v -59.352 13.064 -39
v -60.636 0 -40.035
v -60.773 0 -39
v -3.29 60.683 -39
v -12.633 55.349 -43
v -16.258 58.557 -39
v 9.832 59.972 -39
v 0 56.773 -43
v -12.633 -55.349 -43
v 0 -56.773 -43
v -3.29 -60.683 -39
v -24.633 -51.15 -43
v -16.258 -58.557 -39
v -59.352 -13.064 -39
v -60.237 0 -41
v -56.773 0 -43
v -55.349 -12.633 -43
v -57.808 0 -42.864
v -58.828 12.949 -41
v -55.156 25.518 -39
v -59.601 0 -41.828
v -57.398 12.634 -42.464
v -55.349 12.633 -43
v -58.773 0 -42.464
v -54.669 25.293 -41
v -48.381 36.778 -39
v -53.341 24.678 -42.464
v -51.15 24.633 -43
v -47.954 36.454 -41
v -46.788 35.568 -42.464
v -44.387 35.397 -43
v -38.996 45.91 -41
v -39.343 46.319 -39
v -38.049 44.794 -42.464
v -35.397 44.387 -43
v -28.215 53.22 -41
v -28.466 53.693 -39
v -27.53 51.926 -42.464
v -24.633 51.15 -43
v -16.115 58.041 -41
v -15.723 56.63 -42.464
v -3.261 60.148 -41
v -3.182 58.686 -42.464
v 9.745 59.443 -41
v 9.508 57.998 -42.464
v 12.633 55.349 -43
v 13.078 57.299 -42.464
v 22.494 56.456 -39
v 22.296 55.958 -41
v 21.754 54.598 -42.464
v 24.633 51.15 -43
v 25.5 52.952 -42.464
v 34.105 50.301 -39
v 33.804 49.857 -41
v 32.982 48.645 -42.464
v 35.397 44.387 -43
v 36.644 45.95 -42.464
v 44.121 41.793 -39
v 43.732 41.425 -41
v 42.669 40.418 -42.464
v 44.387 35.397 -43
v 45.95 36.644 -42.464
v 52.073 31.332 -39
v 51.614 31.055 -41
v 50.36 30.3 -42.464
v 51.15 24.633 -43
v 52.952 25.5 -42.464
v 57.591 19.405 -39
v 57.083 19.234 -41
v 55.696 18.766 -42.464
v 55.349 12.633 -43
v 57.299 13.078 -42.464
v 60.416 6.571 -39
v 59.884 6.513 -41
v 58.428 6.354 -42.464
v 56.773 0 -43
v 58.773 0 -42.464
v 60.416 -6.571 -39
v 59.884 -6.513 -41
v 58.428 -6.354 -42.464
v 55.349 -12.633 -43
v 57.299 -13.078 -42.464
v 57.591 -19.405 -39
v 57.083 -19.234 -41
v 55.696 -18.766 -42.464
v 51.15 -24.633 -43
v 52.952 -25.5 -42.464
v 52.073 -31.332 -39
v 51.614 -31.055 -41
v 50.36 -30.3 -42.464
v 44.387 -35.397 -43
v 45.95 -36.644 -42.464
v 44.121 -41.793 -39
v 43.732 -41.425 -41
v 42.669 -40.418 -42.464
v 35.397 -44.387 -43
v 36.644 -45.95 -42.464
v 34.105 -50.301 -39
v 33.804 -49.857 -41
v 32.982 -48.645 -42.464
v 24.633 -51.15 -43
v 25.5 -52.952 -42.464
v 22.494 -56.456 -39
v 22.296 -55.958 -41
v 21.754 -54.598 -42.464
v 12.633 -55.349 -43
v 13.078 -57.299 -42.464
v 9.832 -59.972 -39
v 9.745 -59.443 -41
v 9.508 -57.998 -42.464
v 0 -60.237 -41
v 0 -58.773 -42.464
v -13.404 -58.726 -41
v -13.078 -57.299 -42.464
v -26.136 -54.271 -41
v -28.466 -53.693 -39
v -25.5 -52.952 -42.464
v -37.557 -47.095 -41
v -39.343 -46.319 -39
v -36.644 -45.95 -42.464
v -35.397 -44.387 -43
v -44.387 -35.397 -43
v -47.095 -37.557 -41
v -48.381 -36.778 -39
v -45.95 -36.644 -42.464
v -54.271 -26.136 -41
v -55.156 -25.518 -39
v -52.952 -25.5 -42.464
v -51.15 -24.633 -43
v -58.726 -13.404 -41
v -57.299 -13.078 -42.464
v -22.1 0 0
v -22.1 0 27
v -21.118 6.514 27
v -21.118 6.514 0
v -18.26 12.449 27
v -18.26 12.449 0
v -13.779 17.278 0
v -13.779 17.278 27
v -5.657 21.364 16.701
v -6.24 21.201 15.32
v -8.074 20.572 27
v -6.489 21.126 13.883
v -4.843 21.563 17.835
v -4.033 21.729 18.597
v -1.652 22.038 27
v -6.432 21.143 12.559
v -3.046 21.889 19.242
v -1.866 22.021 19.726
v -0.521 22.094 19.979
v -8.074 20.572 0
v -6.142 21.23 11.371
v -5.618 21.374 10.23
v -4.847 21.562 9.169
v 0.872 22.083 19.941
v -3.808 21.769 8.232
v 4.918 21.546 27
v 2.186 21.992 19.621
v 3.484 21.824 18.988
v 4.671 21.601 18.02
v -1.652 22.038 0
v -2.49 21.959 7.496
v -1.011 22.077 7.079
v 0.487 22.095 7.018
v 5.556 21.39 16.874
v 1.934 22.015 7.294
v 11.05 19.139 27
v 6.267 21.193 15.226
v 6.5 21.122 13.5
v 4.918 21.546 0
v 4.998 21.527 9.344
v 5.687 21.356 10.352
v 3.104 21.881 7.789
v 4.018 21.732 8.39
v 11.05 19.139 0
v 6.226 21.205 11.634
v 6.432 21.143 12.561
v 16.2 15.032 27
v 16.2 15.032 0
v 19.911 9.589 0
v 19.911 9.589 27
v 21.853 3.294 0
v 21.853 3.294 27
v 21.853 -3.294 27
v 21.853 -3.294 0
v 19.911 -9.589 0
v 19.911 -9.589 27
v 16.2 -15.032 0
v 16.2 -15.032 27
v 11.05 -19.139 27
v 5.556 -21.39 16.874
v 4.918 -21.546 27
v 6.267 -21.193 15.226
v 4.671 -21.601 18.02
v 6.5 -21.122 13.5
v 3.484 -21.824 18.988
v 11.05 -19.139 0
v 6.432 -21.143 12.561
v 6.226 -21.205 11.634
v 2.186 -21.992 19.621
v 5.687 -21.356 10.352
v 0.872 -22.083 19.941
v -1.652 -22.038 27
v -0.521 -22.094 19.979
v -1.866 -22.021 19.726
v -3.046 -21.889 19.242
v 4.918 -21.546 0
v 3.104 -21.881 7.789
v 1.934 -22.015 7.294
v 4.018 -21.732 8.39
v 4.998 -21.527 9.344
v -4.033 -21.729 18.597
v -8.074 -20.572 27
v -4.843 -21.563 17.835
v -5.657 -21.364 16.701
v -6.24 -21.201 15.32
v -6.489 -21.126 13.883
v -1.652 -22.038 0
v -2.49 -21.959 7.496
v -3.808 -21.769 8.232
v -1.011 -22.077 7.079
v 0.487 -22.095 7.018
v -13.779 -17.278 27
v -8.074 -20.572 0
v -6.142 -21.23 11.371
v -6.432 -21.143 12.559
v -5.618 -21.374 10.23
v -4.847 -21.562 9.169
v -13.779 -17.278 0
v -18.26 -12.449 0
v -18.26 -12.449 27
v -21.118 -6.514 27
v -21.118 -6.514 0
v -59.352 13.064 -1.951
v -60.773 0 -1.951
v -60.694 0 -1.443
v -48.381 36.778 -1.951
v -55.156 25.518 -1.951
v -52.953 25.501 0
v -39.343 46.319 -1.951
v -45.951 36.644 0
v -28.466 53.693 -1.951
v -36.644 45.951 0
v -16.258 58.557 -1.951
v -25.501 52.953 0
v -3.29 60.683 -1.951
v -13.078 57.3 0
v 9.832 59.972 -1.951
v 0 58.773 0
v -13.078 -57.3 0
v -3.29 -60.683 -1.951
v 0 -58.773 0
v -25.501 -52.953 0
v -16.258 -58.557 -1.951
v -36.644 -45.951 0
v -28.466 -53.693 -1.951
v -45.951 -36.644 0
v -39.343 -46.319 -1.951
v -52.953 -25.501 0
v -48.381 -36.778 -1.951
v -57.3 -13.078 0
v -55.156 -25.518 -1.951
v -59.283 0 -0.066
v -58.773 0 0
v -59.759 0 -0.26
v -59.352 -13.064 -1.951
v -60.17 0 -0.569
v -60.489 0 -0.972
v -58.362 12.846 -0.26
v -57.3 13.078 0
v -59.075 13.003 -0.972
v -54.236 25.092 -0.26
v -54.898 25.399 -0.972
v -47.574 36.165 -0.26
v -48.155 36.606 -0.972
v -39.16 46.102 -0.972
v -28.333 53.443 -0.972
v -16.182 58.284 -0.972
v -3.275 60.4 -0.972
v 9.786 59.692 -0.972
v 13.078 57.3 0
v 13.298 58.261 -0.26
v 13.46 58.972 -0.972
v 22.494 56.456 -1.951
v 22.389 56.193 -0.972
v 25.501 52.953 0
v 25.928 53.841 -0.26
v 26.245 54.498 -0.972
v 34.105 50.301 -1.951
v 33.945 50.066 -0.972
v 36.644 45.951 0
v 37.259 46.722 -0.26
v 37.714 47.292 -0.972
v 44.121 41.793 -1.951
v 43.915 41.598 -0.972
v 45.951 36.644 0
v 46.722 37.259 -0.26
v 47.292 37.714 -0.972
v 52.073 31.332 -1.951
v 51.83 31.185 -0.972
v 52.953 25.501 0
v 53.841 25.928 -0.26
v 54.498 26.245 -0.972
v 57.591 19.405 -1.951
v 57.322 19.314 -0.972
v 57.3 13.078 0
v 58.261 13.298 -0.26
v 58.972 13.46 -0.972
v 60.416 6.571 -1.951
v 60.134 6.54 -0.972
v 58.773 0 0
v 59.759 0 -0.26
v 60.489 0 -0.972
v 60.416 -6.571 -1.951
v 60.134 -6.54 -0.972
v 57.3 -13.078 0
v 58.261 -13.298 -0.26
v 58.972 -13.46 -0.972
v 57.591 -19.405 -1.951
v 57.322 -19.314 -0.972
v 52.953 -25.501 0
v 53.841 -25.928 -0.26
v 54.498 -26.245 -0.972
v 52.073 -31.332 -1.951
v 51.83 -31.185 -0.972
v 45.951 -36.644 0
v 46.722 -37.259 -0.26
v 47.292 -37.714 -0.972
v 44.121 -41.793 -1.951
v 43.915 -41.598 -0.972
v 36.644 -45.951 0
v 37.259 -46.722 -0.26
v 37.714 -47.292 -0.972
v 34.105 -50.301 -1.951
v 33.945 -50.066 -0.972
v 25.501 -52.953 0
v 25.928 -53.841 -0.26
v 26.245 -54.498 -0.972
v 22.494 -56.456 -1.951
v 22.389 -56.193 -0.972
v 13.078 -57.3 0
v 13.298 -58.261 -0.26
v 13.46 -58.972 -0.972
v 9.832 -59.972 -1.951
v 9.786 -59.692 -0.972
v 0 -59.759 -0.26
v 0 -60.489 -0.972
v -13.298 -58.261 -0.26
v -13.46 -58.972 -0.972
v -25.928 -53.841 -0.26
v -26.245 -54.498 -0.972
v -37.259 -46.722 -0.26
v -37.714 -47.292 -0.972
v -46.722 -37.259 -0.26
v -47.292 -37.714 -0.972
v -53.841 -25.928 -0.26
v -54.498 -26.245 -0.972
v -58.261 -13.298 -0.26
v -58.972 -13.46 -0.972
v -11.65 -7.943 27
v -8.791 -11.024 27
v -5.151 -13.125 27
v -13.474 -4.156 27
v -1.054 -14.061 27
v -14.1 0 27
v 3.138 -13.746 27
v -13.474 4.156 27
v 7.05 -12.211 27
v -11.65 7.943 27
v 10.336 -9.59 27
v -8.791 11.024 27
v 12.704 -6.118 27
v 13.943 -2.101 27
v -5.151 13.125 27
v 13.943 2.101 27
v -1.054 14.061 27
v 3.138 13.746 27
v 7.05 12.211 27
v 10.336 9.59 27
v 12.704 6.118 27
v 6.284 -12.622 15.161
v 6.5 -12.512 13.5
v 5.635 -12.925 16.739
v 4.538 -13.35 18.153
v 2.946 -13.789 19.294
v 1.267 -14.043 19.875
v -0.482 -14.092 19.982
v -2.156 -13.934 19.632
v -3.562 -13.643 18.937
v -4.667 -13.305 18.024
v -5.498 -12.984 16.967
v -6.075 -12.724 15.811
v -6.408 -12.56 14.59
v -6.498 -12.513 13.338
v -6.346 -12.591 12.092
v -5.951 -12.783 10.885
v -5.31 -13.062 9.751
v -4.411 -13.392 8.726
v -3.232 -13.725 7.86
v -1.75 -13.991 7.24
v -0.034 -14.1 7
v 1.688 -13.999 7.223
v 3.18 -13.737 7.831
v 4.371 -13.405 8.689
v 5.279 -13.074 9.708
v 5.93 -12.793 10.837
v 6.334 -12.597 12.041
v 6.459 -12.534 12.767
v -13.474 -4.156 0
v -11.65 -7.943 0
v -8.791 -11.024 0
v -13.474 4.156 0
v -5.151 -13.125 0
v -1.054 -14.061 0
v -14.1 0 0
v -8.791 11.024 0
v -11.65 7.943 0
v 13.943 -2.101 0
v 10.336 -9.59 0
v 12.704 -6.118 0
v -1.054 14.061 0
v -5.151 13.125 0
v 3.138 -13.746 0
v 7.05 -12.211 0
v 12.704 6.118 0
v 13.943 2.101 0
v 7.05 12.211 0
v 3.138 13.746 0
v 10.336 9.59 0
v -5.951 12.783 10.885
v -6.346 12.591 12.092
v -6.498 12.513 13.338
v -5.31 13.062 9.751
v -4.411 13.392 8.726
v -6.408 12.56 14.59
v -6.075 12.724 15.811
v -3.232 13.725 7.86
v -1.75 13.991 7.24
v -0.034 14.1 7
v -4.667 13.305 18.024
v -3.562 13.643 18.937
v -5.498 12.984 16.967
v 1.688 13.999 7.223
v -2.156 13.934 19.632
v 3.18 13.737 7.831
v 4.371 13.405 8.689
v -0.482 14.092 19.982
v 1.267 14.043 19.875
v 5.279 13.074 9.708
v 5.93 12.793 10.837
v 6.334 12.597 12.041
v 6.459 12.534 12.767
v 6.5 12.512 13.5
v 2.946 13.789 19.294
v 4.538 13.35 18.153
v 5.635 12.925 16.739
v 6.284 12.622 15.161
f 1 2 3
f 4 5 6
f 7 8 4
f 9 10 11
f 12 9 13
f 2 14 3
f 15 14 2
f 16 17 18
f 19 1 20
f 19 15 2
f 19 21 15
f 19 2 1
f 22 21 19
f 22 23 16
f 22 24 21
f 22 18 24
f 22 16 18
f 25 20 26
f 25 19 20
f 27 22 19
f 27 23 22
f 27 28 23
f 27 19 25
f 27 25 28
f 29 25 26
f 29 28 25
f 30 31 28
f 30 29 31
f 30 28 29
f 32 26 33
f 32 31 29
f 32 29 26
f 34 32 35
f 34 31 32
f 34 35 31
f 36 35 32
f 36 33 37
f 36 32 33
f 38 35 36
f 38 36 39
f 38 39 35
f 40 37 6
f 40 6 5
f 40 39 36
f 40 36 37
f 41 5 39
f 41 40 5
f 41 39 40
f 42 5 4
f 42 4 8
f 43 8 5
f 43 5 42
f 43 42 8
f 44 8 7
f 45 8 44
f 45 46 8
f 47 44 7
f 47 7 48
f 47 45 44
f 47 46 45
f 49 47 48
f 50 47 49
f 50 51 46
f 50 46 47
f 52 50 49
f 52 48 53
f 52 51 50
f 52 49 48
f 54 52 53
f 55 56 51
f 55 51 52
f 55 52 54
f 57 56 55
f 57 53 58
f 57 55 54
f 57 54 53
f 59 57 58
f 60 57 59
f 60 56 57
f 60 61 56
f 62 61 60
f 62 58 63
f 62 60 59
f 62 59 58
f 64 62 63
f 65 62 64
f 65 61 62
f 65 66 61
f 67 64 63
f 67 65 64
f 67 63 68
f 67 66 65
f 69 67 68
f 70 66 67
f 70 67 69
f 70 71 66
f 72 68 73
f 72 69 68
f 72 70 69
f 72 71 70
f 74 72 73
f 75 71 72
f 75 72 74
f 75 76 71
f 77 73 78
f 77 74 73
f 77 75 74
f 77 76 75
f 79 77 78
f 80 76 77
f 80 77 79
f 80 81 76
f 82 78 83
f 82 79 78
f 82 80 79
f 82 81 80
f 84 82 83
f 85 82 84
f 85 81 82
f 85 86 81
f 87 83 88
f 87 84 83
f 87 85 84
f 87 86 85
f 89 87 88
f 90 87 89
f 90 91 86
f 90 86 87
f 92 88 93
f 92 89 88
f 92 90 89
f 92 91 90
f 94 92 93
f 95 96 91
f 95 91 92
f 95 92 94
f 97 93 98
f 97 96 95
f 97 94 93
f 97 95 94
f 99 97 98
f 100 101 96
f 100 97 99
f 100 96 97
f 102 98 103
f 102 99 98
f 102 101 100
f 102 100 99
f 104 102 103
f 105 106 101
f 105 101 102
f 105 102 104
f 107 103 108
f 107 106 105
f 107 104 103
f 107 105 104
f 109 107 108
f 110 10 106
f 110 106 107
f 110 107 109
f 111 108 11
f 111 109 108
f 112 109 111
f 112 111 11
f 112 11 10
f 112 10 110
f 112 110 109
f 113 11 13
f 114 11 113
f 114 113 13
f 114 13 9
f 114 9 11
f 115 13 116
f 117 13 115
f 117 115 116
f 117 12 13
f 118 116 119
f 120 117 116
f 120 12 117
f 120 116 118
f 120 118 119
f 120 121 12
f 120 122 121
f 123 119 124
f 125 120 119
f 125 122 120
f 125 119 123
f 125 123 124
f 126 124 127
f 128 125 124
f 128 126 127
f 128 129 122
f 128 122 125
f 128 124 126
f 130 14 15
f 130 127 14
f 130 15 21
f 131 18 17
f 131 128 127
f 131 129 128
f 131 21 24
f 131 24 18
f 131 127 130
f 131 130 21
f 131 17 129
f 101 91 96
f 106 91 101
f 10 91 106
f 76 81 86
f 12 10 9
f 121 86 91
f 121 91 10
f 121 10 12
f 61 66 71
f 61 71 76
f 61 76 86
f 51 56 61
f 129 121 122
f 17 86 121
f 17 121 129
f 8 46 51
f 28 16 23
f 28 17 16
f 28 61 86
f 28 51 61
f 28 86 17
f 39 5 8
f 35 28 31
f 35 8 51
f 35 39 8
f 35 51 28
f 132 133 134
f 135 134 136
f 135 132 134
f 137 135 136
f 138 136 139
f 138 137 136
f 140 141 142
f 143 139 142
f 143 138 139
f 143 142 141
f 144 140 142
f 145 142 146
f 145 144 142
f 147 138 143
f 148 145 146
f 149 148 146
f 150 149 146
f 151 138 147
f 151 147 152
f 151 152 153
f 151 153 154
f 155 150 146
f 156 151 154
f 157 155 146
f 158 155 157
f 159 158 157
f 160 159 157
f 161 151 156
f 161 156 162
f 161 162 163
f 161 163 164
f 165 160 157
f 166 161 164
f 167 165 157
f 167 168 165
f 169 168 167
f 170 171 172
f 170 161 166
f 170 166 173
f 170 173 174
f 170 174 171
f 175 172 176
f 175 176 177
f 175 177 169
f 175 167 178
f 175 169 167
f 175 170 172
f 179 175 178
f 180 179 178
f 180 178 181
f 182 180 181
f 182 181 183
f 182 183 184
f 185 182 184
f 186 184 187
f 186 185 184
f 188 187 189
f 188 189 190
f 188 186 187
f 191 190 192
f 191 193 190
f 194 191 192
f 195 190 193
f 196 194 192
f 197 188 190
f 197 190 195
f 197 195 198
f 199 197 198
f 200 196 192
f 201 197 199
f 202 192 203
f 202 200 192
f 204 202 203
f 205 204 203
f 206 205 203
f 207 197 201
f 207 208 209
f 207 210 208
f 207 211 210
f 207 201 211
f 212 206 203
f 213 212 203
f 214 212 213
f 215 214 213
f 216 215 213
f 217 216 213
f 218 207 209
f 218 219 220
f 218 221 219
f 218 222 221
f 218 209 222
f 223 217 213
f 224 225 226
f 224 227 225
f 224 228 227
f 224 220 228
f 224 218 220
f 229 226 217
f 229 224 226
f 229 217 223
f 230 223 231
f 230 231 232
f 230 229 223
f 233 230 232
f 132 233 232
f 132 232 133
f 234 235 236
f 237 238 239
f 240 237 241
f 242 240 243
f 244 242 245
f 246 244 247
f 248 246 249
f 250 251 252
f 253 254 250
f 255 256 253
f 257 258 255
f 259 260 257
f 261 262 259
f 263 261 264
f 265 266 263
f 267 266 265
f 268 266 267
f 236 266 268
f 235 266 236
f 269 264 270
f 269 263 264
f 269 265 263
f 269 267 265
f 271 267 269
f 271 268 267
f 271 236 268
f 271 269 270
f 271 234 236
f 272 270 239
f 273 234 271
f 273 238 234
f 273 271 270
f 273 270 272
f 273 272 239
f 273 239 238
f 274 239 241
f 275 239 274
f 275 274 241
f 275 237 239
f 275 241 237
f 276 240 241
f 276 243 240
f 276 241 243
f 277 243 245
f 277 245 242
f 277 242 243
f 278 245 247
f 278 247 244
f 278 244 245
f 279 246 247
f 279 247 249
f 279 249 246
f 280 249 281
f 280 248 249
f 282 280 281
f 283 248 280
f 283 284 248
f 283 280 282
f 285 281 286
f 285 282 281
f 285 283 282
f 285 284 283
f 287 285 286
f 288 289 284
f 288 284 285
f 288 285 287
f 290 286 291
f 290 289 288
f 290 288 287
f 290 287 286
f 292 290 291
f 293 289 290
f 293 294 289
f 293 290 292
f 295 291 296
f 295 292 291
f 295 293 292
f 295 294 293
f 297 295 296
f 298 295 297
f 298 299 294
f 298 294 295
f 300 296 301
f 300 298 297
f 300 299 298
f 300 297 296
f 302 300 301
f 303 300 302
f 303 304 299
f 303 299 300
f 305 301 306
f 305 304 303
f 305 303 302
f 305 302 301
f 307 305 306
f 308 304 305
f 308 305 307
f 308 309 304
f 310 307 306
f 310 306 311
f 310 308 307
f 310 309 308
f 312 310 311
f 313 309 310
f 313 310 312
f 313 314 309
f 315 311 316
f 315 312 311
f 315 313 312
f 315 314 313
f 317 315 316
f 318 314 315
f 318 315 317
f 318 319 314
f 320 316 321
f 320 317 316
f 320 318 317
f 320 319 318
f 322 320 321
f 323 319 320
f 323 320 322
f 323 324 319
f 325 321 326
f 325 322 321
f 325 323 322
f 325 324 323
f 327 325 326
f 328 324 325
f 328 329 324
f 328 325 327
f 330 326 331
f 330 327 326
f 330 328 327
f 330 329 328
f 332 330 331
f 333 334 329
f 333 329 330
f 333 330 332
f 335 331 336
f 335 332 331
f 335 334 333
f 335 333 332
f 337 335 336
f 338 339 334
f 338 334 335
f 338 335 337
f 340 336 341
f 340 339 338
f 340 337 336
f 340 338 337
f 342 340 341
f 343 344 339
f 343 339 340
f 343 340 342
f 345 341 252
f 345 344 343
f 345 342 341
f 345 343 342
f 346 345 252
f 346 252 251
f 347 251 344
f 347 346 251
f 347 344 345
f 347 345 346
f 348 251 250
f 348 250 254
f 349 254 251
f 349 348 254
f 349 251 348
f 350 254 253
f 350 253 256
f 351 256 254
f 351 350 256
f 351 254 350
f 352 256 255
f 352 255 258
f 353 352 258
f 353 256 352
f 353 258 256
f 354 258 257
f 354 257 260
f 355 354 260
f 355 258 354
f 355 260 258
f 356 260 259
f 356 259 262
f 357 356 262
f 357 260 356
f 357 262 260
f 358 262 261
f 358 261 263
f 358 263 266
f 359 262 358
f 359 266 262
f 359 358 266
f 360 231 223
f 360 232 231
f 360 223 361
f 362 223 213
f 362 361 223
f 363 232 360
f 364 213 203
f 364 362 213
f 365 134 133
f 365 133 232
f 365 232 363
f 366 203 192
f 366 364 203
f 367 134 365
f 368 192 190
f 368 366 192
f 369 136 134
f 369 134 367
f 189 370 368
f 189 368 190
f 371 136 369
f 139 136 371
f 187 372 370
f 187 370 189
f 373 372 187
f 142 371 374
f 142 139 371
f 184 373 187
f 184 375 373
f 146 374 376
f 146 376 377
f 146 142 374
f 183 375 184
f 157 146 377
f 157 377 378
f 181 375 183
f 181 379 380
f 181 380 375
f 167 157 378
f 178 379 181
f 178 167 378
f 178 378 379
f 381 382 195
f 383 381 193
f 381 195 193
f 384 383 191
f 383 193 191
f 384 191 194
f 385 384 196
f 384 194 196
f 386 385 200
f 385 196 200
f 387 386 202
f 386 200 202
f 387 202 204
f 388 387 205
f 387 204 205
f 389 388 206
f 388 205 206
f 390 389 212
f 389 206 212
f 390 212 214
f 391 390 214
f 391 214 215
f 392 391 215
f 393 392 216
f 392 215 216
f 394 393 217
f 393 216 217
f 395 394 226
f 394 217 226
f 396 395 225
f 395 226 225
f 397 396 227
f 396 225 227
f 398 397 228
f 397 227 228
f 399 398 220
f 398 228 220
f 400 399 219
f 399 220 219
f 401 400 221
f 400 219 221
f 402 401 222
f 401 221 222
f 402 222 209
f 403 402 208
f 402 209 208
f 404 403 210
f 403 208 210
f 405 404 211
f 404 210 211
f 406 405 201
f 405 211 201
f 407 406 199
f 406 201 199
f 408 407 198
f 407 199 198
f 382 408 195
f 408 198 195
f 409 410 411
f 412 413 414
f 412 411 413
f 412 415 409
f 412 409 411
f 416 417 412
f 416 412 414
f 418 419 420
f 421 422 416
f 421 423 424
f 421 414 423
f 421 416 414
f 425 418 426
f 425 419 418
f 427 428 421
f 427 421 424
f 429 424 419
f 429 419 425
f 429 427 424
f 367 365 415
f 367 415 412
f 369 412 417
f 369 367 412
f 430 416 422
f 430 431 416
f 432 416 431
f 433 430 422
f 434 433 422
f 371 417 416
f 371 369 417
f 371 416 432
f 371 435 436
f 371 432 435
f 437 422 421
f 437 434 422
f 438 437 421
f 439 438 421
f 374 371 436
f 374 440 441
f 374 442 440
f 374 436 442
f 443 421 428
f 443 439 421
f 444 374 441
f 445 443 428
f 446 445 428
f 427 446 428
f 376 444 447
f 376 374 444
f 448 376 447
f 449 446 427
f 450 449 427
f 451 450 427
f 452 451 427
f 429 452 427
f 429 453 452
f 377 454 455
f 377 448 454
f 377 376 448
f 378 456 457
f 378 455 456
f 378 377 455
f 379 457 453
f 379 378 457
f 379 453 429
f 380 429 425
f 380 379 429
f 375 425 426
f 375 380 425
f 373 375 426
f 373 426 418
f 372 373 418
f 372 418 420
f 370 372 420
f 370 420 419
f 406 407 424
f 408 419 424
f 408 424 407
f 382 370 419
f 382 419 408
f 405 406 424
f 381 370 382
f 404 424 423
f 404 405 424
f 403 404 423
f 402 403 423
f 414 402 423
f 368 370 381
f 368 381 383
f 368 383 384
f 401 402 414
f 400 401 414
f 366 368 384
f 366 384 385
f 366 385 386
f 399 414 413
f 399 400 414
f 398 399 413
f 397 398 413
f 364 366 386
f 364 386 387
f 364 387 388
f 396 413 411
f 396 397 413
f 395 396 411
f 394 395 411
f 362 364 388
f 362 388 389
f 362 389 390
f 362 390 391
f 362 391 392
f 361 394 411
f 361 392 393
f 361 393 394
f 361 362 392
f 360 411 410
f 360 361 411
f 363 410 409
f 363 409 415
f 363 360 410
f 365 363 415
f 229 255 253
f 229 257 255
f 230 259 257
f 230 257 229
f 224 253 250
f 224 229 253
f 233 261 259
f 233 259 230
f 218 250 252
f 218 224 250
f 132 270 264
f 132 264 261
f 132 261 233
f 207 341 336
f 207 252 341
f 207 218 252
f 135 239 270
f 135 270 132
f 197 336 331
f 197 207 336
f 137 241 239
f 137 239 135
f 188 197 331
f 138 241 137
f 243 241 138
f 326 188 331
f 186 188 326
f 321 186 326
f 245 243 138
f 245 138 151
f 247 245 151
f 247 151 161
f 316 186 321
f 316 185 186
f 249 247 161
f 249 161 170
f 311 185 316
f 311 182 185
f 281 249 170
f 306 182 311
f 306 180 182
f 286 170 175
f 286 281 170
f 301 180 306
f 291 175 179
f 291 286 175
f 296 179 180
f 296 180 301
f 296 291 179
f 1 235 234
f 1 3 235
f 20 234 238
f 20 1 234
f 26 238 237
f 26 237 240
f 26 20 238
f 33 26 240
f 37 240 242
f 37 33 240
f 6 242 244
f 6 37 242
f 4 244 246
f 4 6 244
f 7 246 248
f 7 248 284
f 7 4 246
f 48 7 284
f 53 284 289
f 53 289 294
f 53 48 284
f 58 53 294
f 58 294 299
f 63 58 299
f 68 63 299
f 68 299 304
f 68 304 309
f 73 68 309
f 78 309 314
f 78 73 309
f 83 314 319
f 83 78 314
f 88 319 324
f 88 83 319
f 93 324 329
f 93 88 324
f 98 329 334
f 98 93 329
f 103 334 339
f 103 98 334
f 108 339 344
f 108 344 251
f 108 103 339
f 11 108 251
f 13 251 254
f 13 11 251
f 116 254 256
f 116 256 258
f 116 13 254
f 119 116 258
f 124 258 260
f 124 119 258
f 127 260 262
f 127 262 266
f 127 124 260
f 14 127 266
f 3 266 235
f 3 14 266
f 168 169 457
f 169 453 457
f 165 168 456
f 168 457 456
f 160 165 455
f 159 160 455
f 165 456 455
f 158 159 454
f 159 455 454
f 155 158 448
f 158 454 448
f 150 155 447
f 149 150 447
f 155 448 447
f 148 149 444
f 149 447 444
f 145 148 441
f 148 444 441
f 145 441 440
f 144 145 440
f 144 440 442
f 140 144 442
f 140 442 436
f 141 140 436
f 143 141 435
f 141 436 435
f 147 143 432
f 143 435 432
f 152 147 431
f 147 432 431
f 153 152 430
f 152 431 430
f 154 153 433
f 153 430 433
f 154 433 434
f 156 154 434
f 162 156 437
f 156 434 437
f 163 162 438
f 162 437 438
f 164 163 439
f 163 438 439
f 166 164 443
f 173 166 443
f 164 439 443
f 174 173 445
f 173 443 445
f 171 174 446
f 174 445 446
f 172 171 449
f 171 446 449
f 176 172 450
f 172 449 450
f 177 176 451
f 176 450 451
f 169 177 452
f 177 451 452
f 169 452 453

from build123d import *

# Parameters (mm, degrees)
F2_R     = 6.5
F3_DEPTH = 30


with BuildPart() as f1:
    # F0 (on Front) → F1 (revolve)
    with BuildSketch(Plane.XZ):
        with BuildLine():
            Line((-14.1, 0), (-14.1, 27))
            Line((-14.1, 27), (-22.1, 27))
            Line((-22.1, 27), (-22.1, 0))
            Line((-22.1, 0), (-58.77316, 0))
            ThreePointArc((-58.77316, 0), (-60.170035, -0.568658), (-60.772566, -1.95126))
            Line((-60.772566, -1.95126), (-60.772566, -2.403001))
            Line((-60.772566, -2.403001), (-60.772566, -39))
            ThreePointArc((-60.772566, -39), (-59.600994, -41.828427), (-56.772566, -43))
            Line((-56.772566, -43), (-56.4, -43))
            Line((-56.4, -43), (0, -43))
            Line((0, -43), (0, 0))
            Line((0, 0), (-14.1, 0))
        make_face()
    revolve(axis=Axis((0, 0, -21.5), (0, 0, -1)))

    # F2 (on Front) → F3 (cut, symmetric)
    with BuildSketch(Plane.XZ):
        with Locations((0, 13.5)):
            Circle(F2_R)
    extrude(amount=F3_DEPTH, both=True, mode=Mode.SUBTRACT)


solid = f1.part
